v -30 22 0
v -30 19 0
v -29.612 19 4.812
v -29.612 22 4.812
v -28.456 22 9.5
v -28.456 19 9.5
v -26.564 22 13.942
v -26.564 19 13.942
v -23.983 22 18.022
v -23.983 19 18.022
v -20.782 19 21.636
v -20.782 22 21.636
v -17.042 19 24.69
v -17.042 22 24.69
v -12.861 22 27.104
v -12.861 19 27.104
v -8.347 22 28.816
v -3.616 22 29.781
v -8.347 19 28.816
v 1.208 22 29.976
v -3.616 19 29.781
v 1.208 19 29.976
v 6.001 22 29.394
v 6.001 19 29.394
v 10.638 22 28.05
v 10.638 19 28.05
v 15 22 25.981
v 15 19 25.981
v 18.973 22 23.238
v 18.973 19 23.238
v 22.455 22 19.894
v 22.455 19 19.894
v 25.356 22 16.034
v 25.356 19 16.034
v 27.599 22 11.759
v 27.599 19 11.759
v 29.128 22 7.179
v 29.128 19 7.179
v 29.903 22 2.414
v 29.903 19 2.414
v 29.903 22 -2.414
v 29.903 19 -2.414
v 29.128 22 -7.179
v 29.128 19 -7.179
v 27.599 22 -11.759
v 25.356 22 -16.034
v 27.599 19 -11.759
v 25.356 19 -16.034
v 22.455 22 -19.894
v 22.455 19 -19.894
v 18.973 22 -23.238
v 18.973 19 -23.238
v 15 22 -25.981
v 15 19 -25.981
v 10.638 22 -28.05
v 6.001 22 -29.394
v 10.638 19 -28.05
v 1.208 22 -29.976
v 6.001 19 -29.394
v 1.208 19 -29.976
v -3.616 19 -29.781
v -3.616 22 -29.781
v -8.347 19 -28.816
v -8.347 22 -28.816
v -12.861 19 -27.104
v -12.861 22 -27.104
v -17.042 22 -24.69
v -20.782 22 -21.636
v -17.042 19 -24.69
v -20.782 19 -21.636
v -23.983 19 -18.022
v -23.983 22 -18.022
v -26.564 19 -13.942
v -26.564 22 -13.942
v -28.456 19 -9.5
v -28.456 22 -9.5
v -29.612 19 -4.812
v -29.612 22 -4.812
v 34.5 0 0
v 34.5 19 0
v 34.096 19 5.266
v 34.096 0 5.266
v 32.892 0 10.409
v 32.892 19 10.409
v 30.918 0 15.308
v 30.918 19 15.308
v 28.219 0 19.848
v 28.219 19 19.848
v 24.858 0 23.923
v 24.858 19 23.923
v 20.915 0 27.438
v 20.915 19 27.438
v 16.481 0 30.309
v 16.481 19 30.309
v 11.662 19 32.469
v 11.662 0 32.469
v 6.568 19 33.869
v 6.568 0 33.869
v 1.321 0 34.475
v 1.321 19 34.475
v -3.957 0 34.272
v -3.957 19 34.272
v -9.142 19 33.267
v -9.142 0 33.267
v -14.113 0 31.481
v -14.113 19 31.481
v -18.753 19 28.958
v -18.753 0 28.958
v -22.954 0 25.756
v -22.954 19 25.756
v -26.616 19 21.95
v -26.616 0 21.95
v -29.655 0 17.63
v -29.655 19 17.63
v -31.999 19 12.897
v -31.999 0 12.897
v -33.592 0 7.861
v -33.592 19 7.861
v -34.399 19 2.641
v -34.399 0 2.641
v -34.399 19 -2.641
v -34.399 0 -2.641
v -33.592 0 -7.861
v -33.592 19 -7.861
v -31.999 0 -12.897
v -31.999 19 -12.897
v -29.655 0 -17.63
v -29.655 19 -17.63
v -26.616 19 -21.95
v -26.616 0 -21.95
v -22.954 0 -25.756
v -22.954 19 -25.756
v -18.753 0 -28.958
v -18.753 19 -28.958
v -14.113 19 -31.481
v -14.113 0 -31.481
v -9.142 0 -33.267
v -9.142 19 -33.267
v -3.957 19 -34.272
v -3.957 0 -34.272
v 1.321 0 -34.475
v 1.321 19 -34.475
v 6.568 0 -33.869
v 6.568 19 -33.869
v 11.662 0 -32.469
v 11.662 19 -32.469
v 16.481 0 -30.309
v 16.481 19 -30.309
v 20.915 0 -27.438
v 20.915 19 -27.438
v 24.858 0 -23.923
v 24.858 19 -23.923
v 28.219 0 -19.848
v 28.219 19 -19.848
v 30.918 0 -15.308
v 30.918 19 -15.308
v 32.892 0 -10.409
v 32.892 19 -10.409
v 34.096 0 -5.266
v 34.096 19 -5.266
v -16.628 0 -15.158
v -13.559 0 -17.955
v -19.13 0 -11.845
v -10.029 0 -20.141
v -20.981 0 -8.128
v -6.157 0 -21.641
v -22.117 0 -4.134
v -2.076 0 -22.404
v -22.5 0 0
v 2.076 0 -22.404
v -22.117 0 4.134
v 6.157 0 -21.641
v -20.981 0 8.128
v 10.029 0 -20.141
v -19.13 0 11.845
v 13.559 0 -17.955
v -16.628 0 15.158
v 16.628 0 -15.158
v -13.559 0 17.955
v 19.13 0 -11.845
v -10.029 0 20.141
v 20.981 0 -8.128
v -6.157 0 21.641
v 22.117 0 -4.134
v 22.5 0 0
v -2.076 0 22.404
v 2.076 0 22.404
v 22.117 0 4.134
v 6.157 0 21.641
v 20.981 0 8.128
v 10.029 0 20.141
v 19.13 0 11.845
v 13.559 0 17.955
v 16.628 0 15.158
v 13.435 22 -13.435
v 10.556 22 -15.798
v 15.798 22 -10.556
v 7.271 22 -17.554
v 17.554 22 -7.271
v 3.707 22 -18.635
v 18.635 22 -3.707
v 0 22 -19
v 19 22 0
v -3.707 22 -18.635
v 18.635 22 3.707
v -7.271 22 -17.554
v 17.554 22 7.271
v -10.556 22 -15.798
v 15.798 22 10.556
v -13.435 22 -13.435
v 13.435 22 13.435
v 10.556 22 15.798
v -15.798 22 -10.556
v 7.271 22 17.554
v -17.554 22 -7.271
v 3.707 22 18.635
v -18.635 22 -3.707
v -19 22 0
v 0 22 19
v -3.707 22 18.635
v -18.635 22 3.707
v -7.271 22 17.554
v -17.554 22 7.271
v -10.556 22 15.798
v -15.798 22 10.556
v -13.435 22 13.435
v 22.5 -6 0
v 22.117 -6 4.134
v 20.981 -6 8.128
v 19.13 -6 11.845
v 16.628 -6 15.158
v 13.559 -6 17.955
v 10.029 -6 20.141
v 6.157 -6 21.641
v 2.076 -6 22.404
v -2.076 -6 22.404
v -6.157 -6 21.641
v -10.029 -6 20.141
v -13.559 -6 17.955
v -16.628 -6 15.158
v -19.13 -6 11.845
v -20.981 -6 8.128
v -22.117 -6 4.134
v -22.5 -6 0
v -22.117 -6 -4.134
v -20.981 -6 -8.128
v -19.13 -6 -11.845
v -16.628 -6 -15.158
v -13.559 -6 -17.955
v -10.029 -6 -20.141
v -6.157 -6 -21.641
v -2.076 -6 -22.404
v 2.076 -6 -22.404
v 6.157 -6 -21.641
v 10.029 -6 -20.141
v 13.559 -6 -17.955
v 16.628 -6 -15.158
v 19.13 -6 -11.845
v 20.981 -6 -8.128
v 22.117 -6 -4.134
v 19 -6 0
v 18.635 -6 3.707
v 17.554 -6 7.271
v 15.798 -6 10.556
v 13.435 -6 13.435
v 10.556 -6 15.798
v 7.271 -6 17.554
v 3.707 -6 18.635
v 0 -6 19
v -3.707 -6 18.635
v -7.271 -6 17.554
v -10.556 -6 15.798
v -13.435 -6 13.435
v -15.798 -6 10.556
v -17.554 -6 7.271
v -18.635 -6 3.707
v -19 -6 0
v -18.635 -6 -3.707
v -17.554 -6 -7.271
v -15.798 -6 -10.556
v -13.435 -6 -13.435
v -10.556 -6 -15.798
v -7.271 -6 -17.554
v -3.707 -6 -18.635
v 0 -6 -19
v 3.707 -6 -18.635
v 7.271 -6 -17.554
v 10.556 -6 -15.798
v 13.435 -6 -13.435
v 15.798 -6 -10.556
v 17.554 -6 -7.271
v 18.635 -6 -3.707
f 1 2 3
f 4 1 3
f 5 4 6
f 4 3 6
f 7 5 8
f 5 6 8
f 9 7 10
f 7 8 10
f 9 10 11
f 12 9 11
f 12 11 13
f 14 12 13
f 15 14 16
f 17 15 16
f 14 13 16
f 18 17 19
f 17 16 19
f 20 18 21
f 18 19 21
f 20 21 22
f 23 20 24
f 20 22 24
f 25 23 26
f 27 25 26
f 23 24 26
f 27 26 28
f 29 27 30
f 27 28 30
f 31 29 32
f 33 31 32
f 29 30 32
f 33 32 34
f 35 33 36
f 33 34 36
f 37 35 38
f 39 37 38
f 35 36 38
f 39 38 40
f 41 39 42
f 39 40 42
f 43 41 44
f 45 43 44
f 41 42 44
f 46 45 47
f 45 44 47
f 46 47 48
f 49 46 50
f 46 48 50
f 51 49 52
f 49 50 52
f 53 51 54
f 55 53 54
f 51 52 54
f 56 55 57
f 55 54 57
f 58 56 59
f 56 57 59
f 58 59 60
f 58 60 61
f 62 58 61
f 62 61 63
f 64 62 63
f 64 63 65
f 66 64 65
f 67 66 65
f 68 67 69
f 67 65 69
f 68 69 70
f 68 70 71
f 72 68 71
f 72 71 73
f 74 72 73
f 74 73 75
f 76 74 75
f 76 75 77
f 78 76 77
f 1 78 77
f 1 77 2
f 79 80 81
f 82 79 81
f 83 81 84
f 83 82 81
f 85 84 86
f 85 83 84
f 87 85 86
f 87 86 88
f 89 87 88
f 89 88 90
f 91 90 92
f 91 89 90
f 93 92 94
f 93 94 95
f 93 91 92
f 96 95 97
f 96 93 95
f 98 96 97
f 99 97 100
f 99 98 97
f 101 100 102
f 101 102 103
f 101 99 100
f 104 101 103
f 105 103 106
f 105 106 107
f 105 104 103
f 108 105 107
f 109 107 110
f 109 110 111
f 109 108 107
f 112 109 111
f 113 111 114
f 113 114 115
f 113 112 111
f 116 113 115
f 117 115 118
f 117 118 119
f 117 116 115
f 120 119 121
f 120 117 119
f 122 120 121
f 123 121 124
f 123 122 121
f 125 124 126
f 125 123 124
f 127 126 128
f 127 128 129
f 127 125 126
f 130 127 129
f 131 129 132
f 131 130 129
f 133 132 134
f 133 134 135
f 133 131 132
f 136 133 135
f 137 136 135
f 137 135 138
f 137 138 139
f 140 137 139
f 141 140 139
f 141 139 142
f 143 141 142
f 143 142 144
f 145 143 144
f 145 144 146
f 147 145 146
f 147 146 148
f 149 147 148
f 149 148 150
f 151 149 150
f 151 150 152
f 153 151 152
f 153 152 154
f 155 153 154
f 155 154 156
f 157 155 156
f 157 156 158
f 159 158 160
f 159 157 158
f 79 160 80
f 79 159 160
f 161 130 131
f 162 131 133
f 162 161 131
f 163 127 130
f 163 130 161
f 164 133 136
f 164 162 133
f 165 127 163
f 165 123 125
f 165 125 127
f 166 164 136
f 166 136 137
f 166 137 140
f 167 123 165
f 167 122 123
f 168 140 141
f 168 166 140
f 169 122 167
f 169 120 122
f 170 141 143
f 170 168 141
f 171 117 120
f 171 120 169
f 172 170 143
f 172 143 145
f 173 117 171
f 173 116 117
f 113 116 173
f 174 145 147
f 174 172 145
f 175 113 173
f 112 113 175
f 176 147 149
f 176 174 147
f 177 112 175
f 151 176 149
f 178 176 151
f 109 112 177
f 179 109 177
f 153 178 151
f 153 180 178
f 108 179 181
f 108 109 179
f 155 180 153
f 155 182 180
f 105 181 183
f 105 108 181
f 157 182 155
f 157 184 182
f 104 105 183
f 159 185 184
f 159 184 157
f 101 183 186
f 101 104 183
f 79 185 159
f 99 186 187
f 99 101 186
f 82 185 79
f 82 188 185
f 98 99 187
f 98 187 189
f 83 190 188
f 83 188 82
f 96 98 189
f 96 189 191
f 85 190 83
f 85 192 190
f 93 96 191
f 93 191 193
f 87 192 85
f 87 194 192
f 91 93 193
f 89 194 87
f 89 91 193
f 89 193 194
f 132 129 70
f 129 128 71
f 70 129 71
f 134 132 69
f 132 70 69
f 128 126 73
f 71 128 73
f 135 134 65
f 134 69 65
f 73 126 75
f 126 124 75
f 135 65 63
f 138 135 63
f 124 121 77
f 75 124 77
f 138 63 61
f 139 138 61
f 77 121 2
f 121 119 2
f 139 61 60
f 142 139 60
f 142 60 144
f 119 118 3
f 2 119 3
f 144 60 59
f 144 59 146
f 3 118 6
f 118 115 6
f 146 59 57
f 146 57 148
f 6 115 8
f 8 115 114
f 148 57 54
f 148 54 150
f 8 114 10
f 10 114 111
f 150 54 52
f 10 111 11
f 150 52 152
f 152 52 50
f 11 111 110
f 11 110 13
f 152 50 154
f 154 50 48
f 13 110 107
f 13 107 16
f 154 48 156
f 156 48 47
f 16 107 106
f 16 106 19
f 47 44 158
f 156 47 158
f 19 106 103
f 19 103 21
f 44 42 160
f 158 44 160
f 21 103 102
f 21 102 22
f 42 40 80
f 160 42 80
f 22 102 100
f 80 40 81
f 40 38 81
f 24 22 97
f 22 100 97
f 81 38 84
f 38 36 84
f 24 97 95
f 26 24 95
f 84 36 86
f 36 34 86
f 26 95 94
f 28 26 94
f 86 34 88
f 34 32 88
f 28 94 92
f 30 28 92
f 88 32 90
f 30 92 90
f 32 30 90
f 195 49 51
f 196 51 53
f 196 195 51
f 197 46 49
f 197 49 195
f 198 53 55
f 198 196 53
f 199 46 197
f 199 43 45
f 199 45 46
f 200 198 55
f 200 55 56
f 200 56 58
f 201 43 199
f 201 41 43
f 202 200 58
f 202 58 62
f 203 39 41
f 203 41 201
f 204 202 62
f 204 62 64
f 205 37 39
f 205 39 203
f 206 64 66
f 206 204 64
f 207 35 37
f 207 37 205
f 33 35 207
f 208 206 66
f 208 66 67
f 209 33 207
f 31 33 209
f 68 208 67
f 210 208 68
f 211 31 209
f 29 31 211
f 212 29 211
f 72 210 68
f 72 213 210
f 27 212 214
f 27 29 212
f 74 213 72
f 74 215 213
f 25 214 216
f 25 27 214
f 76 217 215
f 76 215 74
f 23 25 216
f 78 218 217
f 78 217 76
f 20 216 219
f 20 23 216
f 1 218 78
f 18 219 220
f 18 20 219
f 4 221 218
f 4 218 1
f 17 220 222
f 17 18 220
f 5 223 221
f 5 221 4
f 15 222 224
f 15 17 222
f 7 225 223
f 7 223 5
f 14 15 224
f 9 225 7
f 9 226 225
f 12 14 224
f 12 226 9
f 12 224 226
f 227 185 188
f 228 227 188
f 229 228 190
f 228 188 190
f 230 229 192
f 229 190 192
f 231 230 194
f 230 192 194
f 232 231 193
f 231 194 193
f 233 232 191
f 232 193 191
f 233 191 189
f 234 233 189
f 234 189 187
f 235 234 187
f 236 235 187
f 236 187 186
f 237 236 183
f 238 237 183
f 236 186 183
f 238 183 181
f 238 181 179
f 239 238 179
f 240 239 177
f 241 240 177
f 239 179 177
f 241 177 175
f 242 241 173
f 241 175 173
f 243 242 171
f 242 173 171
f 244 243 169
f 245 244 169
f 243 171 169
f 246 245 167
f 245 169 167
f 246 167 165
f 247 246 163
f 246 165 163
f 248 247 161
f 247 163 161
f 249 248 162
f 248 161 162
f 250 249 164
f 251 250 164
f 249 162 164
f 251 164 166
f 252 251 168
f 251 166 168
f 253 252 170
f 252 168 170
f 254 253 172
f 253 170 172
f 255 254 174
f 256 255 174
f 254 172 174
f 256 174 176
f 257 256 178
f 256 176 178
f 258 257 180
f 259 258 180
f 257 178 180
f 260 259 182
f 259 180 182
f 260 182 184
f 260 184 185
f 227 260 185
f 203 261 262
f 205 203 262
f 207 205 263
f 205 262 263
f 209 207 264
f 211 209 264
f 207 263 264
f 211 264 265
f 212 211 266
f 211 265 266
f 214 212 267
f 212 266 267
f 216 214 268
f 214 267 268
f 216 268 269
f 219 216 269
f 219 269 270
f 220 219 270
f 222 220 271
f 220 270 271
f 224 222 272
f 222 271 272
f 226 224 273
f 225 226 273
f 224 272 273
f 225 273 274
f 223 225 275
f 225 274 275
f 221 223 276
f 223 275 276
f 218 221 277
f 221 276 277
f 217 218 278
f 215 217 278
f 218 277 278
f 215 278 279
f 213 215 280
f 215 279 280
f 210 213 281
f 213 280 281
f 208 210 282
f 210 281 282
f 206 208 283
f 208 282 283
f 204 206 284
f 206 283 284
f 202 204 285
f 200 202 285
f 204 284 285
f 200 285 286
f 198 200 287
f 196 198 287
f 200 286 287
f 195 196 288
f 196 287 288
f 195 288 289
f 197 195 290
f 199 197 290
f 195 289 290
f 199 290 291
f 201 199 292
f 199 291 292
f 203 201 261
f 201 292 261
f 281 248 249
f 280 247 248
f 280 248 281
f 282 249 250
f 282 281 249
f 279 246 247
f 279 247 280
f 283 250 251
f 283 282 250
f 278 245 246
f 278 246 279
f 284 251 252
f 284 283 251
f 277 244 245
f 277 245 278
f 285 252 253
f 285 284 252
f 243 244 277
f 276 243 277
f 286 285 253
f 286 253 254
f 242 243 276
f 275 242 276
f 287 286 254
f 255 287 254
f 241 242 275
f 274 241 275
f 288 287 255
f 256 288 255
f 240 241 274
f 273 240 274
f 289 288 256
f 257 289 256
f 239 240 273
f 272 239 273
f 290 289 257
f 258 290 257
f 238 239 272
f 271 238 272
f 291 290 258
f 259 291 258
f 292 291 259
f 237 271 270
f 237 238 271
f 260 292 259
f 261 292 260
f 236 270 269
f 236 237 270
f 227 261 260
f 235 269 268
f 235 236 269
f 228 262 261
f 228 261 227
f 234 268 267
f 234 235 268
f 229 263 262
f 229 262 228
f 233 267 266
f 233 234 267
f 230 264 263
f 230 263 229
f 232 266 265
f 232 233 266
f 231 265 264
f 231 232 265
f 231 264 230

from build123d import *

# Parameters (mm, degrees)
F0_R     = 34.5
F1_DEPTH = 19
F2_R     = 22.5
F3_DEPTH = 6
F4_R     = 30
F5_DEPTH = 3
F6_R     = 19
F7_DEPTH = 28


with BuildPart() as f1:
    # F0 (on Front) → F1 (new body)
    with BuildSketch(Plane.XZ):
        Circle(F0_R)
    extrude(amount=-F1_DEPTH)

    # F2 (on face) → F3 (join)
    with BuildSketch(Plane.XZ):
        Circle(F2_R)
    extrude(amount=F3_DEPTH)

    # F4 (on face) → F5 (join)
    with BuildSketch(Plane(origin=(0, 19, 0), x_dir=(-1, 0, 0), z_dir=(0, 1, 0))):
        Circle(F4_R)
    extrude(amount=F5_DEPTH)

    # F6 (on face) → F7 (cut)
    with BuildSketch(Plane.XZ.offset(6)):
        Circle(F6_R)
    extrude(amount=-F7_DEPTH, mode=Mode.SUBTRACT)


solid = f1.part
